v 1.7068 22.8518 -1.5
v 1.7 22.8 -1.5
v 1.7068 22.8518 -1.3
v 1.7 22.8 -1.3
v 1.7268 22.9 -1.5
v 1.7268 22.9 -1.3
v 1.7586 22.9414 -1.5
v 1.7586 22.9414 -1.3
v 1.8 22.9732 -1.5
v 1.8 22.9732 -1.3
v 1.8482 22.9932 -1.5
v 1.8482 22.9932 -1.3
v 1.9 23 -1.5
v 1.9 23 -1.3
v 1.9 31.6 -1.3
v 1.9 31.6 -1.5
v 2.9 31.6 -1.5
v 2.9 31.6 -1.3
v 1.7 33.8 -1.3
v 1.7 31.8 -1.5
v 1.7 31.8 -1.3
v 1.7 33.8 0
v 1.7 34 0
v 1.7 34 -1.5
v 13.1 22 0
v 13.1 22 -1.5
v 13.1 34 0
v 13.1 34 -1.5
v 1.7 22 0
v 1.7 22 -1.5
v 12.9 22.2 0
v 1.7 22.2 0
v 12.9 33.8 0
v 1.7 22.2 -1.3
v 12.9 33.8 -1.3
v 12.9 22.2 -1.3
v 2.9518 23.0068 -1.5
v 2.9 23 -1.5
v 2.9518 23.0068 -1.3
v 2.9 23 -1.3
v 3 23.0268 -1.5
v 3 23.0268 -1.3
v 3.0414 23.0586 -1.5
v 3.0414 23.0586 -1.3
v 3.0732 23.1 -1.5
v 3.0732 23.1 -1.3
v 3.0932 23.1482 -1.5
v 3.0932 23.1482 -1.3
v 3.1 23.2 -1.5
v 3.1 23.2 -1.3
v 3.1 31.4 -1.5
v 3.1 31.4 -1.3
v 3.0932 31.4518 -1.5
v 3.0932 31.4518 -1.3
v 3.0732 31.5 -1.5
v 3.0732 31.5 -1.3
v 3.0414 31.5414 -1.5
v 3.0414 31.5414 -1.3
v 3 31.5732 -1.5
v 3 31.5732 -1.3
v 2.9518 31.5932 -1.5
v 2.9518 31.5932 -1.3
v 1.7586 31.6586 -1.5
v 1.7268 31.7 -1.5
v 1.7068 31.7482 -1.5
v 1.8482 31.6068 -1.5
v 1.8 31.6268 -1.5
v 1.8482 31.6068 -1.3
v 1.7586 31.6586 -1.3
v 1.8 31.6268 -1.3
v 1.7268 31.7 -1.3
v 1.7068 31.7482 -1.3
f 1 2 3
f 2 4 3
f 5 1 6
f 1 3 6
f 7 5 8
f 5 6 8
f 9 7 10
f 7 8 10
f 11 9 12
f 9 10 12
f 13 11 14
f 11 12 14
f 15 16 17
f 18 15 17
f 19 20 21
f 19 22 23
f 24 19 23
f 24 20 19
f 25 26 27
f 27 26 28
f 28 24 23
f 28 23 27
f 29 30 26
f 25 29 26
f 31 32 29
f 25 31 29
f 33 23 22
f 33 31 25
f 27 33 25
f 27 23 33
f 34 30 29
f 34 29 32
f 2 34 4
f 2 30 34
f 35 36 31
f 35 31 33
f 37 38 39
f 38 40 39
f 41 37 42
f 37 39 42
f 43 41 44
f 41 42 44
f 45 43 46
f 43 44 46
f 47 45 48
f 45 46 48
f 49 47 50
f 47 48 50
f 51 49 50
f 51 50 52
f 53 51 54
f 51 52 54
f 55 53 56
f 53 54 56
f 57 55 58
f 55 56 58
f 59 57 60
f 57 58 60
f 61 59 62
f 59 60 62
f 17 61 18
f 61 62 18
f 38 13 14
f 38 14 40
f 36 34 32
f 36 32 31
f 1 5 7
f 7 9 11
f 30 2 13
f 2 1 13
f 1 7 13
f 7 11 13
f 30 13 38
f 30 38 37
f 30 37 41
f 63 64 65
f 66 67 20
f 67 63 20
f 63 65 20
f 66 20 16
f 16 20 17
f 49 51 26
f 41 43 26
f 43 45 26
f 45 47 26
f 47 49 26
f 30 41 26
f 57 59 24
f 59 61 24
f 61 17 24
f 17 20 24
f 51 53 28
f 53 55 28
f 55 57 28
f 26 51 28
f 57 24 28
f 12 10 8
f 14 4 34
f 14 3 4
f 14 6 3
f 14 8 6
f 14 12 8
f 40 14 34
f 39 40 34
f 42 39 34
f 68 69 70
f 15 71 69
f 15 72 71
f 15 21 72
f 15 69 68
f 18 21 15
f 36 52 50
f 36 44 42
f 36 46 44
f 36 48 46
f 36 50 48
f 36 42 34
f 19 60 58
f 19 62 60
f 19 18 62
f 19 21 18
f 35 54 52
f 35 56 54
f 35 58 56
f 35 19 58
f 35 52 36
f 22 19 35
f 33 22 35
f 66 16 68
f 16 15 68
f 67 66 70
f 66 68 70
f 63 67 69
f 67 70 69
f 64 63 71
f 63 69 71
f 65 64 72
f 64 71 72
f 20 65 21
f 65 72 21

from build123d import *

# Parameters (mm, degrees)
BOX070_W     = 1.4
BOX070_H     = 8.6
BOX070_DEPTH = 0.2
FILLET018_R  = 0.2
BOX069_W     = 11.2
BOX069_H     = 11.6
BOX069_DEPTH = 1.3
BOX068_W     = 11.4
BOX068_H     = 12
BOX068_DEPTH = 1.5
FILLET019_R  = 0.2


with BuildPart() as fillet020:
    # Box070 → Box070 (new body)
    with BuildSketch(Plane(origin=(0, 1, 0), x_dir=(1, 0, 0), z_dir=(0, 0, 1))):
        with Locations((0.7, 4.3)):
            Rectangle(BOX070_W, BOX070_H)
    extrude(amount=BOX070_DEPTH)

    # Fillet018
    fillet018_edges = [fillet020.edges().sort_by_distance(p)[0] for p in [
        (1.4, 1, 0.1),
        (1.4, 9.6, 0.1),
    ]]
    fillet(fillet018_edges, radius=FILLET018_R)


with BuildPart() as fusion052:
    # Box069 → Box069 (new body)
    with BuildSketch(Plane(origin=(0, 0.2, 0.2), x_dir=(1, 0, 0), z_dir=(0, 0, 1))):
        with Locations((5.6, 5.8)):
            Rectangle(BOX069_W, BOX069_H)
    extrude(amount=BOX069_DEPTH)

    # Fusion052: union Fillet020
    add(fillet020.part)


with BuildPart() as sd_card_slot:
    # Box068 → Box068 (new body)
    with BuildSketch(Plane.XY):
        with Locations((5.7, 6)):
            Rectangle(BOX068_W, BOX068_H)
    extrude(amount=BOX068_DEPTH)

    # Cut017: cut Fusion052
    add(fusion052.part, mode=Mode.SUBTRACT)

    # Fillet019
    fillet019_edges = [sd_card_slot.edges().sort_by_distance(p)[0] for p in [
        (0, 1, 0.1),
        (0, 9.6, 0.1),
    ]]
    fillet(fillet019_edges, radius=FILLET019_R)


with BuildPart() as sd_card_slot_1:
    # Fillet019 placement: moved
    add(sd_card_slot.part.moved(Location((1.7, 22, -1.5))))


solid = sd_card_slot_1.part
